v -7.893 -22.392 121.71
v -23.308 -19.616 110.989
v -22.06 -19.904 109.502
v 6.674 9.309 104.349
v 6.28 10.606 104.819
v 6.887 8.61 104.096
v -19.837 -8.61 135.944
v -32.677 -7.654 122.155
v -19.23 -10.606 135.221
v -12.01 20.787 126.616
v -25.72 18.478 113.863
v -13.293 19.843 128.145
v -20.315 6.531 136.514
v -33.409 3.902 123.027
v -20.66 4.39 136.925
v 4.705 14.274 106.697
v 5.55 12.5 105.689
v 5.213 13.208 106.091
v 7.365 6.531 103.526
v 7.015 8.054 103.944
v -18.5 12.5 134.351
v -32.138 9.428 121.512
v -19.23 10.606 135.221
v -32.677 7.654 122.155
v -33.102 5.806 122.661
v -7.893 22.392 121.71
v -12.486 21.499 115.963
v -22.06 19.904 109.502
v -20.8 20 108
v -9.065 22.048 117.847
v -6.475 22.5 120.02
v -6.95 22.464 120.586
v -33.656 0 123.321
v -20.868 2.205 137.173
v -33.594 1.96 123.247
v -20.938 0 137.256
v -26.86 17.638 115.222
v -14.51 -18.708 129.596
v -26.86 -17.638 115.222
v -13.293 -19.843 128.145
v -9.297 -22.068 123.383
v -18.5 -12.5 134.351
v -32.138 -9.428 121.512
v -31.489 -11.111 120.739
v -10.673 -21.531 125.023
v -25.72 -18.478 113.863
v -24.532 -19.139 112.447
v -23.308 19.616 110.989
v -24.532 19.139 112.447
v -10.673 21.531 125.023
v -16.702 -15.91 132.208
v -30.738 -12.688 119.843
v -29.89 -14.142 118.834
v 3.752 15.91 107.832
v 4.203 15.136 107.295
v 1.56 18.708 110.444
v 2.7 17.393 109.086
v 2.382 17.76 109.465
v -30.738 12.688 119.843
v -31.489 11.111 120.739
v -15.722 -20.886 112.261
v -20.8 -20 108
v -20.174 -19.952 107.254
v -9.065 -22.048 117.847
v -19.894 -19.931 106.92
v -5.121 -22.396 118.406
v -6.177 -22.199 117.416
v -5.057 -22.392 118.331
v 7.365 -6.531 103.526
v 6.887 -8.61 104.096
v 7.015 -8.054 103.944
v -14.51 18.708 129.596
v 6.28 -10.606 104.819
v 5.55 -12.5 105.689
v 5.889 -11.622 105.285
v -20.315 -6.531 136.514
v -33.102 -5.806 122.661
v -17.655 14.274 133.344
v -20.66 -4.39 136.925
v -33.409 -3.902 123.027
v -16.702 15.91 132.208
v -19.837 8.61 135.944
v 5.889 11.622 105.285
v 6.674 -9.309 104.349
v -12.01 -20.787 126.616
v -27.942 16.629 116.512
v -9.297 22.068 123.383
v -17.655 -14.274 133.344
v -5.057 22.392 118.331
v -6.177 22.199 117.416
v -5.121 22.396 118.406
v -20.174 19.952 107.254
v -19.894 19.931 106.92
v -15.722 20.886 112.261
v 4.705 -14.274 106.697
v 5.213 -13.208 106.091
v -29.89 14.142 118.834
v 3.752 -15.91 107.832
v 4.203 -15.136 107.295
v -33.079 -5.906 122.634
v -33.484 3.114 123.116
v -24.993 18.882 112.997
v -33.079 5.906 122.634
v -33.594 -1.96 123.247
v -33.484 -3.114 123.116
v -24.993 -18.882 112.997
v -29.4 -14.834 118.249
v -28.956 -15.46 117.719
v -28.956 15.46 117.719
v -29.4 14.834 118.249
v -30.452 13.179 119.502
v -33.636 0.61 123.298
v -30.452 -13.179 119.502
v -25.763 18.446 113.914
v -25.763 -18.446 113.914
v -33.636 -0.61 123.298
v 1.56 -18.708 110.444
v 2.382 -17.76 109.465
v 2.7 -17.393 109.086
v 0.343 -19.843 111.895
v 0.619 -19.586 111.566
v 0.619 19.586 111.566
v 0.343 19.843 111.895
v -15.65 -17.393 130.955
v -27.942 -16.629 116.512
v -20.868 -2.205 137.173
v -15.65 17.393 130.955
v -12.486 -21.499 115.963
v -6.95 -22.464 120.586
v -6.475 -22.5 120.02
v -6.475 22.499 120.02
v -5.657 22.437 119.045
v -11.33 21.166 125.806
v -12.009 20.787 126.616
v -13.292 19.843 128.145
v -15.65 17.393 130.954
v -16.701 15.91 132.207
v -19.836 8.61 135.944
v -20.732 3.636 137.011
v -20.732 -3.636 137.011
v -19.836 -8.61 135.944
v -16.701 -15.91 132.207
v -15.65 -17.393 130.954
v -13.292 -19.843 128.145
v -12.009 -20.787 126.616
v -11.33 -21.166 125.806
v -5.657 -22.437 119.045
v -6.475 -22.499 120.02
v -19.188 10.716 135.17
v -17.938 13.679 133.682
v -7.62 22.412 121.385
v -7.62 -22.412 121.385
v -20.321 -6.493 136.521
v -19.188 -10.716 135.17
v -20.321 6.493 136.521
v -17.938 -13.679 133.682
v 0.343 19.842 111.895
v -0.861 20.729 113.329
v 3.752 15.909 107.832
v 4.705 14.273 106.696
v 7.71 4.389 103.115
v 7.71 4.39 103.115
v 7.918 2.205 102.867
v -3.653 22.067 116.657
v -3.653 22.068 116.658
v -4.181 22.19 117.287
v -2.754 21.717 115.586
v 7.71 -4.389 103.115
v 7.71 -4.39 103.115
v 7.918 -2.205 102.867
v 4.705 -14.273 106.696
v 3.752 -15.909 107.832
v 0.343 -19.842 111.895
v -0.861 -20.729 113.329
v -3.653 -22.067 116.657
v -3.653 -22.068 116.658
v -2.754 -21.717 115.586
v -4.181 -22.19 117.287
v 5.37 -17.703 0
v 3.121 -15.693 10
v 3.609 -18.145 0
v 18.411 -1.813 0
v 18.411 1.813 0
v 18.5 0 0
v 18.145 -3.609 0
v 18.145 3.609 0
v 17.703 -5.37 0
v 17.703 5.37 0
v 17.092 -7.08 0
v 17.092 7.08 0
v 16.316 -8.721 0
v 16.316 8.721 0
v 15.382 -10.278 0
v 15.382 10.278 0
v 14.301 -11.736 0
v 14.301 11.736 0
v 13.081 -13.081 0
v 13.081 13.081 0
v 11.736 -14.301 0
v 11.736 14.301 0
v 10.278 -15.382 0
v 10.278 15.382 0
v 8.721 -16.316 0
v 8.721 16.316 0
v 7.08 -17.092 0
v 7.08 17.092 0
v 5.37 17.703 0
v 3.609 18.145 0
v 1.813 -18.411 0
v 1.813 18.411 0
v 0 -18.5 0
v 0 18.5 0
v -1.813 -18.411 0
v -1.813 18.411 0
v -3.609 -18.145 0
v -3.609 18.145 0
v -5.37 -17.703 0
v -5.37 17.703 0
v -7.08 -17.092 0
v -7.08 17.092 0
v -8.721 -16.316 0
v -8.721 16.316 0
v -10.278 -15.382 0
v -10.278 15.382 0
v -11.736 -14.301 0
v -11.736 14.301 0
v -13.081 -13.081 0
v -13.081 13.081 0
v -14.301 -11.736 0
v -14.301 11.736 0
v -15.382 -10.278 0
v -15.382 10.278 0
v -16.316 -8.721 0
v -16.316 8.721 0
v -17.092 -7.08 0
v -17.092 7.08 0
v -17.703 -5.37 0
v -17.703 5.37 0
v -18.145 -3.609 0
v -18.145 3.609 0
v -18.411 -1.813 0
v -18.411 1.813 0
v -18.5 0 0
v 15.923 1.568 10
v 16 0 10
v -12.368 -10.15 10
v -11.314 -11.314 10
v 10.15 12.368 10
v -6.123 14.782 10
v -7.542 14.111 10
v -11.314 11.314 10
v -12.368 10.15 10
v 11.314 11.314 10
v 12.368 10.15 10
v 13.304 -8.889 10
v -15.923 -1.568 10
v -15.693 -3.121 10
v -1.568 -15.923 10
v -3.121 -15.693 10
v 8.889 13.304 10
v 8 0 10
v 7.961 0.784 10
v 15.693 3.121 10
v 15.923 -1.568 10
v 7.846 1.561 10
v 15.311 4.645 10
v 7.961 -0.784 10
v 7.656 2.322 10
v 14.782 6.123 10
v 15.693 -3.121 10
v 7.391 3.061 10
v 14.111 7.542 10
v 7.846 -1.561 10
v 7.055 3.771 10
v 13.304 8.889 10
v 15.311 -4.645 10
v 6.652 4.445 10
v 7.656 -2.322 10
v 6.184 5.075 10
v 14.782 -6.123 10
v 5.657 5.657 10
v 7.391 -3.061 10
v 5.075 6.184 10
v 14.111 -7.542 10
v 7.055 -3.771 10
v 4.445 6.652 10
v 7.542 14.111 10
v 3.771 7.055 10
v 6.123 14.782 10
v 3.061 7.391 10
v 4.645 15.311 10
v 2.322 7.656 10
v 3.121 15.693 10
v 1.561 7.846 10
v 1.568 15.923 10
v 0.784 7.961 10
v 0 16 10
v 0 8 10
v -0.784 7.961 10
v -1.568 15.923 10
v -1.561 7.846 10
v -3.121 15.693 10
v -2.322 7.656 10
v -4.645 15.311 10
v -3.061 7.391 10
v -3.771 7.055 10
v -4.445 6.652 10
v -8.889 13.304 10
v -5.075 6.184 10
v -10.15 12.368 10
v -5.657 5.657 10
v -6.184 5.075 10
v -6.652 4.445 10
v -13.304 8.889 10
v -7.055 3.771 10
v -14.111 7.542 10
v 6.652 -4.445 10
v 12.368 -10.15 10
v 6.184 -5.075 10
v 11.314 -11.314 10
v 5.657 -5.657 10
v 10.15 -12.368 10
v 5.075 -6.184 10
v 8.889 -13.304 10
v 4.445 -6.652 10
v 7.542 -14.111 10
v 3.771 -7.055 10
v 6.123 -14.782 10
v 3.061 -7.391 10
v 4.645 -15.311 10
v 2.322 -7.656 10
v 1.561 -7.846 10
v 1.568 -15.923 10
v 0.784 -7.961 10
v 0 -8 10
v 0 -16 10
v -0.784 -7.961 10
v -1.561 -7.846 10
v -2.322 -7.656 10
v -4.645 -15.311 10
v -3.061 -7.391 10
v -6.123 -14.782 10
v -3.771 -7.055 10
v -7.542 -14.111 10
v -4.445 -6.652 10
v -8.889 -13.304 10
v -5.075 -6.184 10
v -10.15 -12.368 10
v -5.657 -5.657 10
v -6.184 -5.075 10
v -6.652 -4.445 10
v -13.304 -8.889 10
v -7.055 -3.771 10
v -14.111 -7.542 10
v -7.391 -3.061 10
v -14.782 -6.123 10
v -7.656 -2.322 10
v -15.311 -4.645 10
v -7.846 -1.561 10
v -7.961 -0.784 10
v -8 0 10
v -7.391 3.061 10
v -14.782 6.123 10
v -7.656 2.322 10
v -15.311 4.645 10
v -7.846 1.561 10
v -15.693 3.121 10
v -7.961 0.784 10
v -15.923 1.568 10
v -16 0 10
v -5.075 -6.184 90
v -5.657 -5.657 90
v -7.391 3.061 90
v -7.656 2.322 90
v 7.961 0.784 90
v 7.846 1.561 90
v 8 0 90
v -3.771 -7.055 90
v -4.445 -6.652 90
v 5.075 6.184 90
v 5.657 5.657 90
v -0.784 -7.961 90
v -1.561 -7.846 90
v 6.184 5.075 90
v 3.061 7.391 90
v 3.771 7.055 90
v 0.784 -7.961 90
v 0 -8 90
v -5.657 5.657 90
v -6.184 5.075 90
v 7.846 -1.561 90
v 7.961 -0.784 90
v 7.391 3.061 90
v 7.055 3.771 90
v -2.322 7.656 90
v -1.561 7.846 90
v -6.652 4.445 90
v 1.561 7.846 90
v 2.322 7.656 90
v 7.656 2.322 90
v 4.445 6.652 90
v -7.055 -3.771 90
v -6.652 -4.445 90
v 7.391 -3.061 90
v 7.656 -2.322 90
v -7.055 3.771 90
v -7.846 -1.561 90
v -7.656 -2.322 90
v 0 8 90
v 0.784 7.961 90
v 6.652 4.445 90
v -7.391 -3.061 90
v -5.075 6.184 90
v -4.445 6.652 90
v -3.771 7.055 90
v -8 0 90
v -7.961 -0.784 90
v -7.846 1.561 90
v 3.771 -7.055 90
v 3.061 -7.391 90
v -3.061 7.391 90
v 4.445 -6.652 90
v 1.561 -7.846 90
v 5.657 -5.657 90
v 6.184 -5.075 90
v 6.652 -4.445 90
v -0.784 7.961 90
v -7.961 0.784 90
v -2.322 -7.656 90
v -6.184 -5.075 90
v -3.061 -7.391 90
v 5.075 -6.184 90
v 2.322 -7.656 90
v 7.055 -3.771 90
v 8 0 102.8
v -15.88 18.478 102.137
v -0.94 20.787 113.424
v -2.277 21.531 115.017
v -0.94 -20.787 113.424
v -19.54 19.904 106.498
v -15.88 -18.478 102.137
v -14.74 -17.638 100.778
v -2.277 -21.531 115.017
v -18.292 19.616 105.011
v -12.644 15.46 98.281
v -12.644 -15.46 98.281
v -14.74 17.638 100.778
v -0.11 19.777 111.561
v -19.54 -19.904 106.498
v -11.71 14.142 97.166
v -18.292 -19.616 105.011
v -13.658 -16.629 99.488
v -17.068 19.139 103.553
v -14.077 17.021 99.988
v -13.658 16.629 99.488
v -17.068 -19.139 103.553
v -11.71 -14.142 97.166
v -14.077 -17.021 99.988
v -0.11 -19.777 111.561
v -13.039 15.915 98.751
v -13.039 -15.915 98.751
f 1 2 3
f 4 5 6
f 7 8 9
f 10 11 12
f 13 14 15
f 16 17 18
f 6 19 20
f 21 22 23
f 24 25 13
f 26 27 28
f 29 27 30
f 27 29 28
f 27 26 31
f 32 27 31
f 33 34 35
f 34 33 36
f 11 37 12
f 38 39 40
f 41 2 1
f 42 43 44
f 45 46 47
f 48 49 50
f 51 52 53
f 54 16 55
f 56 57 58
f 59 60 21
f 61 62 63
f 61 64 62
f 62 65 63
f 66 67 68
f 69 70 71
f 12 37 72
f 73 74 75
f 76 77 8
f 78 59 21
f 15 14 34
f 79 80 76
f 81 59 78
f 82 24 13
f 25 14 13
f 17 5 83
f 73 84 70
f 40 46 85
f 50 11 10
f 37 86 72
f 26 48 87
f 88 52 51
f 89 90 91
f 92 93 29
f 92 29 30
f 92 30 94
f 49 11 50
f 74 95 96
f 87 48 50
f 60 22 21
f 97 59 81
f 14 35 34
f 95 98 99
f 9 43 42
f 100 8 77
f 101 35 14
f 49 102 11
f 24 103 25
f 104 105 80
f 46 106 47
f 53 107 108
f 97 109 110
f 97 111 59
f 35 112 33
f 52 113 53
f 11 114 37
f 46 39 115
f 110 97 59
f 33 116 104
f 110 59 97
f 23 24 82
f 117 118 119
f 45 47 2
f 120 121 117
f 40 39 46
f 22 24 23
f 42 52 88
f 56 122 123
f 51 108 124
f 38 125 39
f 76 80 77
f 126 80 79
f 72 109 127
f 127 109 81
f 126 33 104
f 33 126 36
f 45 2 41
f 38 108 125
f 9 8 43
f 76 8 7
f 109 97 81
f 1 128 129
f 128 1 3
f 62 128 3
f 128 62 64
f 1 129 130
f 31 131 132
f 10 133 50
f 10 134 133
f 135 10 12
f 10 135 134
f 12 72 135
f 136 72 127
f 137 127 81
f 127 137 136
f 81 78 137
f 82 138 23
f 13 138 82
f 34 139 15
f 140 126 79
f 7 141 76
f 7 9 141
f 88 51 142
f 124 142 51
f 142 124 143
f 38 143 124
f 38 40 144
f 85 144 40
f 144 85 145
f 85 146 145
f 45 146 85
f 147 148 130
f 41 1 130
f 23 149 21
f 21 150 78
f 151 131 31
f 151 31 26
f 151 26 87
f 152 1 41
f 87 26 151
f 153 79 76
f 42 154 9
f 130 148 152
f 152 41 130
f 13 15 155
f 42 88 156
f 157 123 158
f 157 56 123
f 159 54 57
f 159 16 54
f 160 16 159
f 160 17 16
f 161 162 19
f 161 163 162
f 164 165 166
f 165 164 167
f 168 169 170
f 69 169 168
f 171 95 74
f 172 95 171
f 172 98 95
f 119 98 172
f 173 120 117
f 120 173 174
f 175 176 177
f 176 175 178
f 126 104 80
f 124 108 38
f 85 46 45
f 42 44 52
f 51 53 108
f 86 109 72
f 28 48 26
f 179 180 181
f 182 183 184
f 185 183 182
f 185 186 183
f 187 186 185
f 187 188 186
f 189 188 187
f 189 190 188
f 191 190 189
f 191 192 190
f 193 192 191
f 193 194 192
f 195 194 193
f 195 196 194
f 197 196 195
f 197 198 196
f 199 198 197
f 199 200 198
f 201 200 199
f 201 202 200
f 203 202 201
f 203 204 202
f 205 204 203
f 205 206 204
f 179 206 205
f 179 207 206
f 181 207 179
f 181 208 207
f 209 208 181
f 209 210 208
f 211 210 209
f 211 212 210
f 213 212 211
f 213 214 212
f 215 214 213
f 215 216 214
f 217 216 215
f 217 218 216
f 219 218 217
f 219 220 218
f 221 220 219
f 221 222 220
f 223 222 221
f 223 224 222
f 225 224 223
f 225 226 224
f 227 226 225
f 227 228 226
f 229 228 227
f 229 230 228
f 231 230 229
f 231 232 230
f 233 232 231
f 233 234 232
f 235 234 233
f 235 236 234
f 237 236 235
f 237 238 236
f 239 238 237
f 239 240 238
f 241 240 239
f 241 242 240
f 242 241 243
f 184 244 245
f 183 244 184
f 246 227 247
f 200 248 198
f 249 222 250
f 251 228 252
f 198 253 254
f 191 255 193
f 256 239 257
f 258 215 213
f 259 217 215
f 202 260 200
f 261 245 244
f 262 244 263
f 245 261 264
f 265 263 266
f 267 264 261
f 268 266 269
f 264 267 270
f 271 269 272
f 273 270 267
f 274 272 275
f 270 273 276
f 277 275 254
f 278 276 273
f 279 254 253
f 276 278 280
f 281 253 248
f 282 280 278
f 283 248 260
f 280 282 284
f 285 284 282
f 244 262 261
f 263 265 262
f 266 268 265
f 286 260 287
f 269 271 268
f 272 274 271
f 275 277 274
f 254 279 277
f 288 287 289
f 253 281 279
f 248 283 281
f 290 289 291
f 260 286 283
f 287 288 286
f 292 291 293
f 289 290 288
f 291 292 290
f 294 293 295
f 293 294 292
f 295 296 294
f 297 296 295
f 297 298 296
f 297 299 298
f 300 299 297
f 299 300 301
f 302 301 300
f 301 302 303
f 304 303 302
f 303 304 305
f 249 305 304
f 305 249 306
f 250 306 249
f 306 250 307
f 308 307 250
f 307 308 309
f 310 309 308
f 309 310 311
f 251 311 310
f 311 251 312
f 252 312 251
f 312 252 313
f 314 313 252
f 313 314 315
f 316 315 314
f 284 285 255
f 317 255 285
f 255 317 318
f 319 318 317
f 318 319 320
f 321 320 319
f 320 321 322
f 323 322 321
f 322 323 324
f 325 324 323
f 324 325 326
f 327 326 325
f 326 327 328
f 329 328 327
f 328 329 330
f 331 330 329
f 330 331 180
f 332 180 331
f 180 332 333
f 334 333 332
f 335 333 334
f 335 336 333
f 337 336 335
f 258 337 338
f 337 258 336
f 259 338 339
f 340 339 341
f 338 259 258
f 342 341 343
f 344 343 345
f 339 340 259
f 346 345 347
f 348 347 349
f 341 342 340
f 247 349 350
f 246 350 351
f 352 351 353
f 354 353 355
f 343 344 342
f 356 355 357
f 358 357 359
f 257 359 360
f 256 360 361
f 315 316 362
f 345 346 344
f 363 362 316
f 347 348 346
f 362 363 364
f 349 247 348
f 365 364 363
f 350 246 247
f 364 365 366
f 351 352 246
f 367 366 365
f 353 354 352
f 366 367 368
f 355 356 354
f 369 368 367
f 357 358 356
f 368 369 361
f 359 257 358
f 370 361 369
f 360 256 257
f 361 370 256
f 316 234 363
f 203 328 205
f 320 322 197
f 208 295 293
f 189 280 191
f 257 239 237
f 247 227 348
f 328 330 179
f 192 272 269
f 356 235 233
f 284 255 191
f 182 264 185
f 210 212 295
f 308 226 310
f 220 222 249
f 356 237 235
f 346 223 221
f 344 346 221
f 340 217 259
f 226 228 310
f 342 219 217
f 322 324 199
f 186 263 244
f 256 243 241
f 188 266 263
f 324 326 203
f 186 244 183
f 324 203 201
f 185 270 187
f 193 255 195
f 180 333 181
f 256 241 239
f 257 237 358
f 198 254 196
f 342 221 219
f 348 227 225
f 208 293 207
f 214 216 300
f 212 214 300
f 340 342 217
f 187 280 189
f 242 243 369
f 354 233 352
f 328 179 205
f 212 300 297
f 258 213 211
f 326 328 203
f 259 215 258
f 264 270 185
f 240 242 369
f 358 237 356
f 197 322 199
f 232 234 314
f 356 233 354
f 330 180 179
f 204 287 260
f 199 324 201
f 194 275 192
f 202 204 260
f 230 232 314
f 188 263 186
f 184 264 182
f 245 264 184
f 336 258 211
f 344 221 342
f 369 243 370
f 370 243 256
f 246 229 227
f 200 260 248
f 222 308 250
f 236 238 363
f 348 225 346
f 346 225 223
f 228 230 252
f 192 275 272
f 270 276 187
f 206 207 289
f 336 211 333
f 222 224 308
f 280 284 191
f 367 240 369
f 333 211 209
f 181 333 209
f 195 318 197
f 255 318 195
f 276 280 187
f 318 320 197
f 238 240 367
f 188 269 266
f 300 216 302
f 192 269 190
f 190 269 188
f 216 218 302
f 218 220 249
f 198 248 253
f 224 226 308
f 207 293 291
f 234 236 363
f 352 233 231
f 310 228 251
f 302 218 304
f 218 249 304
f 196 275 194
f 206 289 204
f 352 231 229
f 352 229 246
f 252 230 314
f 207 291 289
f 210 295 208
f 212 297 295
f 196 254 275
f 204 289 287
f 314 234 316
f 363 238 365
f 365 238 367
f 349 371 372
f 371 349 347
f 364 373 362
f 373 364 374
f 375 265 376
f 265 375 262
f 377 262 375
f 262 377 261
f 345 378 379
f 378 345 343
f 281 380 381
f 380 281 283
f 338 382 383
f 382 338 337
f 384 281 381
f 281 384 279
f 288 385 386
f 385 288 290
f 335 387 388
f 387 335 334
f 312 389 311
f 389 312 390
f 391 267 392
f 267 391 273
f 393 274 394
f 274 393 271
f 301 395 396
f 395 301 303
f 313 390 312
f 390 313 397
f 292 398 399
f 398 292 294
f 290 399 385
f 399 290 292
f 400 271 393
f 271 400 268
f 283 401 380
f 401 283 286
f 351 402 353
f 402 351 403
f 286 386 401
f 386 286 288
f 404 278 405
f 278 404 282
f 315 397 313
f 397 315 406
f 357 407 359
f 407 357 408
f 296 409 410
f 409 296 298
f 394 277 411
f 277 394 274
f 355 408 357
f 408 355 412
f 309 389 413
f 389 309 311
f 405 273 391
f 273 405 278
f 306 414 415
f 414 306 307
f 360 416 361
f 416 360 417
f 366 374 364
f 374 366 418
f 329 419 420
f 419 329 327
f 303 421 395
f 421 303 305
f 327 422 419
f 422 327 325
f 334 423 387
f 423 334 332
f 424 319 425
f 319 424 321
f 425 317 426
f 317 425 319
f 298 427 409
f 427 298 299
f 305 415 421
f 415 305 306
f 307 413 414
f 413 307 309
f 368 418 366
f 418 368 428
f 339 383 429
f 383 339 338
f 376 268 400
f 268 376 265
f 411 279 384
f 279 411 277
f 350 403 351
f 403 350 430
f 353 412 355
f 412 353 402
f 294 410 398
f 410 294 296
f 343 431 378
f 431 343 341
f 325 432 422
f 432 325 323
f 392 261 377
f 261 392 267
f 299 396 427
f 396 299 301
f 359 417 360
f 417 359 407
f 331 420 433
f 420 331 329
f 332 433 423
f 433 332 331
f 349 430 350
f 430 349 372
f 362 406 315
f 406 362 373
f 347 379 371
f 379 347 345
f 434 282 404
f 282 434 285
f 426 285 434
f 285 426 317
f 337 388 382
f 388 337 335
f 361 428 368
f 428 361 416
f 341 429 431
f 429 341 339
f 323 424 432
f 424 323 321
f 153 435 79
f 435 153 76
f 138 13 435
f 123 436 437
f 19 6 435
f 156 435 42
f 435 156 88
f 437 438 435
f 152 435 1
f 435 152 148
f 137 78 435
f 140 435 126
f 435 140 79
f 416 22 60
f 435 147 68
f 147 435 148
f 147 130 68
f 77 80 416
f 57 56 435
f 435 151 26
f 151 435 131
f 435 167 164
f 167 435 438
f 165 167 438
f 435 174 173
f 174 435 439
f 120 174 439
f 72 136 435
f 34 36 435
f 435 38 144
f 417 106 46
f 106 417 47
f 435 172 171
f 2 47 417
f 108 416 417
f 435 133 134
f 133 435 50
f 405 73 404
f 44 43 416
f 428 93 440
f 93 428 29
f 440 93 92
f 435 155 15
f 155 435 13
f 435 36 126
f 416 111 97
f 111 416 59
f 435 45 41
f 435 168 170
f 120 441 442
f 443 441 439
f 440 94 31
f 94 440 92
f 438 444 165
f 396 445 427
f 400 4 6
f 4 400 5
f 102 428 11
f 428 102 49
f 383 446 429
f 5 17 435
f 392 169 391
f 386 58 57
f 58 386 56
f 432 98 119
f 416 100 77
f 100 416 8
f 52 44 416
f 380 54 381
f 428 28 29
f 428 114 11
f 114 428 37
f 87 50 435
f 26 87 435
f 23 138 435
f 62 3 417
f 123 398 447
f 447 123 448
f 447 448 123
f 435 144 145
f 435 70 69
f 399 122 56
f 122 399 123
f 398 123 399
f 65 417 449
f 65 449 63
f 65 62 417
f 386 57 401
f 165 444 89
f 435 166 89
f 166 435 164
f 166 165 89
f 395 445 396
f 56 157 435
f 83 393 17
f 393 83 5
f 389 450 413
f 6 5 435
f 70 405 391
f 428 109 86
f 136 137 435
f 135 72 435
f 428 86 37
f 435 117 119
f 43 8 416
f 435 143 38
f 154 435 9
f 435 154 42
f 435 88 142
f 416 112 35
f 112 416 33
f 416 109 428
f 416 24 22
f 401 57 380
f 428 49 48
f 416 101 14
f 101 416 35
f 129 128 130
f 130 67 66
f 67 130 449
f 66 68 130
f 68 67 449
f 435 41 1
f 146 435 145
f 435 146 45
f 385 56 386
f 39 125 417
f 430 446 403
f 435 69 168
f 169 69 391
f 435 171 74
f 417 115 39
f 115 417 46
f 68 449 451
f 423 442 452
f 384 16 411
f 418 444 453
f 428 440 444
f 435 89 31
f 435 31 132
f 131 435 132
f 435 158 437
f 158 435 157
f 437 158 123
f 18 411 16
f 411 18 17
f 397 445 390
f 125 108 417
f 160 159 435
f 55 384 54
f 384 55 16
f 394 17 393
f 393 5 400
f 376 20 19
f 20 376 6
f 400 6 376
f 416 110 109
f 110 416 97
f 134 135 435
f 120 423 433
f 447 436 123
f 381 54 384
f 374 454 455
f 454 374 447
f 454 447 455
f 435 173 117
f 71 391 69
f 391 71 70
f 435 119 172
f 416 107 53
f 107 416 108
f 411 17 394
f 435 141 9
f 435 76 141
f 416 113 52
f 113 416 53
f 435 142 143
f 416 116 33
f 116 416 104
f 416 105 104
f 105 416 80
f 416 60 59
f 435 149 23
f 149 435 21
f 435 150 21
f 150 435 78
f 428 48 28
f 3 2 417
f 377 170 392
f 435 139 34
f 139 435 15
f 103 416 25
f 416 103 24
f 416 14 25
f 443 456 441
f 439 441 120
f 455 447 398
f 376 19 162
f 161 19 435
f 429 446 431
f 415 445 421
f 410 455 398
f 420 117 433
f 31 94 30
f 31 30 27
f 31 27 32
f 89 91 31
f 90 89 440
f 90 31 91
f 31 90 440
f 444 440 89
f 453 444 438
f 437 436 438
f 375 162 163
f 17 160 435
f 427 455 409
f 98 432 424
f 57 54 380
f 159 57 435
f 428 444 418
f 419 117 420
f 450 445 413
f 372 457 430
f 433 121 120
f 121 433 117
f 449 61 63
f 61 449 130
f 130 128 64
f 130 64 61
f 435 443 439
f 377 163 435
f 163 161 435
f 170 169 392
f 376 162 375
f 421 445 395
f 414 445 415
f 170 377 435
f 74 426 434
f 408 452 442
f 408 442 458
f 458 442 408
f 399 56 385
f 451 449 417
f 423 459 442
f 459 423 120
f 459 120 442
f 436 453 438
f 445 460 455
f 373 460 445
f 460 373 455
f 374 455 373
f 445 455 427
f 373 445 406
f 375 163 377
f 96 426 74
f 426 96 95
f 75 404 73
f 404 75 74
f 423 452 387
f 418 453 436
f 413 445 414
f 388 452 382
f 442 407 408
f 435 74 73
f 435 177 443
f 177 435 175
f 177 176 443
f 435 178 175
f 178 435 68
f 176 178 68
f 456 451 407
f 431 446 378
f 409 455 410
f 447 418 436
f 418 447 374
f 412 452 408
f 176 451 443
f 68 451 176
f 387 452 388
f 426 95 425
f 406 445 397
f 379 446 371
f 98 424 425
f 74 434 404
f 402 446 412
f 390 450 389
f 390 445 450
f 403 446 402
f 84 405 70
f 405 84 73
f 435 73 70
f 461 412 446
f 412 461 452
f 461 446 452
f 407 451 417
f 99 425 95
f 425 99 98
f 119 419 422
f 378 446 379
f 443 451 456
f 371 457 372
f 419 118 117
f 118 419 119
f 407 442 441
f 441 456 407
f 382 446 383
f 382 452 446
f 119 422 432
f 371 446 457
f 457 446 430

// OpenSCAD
//90mm hoch //37mm durchmesser //32mm 18mm

cylinder(h=10,d1=37,d2=32,center=false, $fn=64);

color("red")
cylinder(h=90,d1=16,d2=16,center=false, $fn=64);

module holderstandconnector()
{
    translate([0,0,90])
    color("blue")
    cylinder(h=12.8,d1=16,d2=16,center=false, $fn=64);
}

module holder()
{
    translate([-20.8,0,108])
    rotate([0,50,0])
    difference()
    {
        cylinder(h=18.7,d1=40,d2=45,center=false, $fn=64);
        cylinder(h=18.7,d1=32,d2=37,center=false, $fn=64);
    }
}

holder();

hull()
{
  holderstandconnector();
  holder();
}
